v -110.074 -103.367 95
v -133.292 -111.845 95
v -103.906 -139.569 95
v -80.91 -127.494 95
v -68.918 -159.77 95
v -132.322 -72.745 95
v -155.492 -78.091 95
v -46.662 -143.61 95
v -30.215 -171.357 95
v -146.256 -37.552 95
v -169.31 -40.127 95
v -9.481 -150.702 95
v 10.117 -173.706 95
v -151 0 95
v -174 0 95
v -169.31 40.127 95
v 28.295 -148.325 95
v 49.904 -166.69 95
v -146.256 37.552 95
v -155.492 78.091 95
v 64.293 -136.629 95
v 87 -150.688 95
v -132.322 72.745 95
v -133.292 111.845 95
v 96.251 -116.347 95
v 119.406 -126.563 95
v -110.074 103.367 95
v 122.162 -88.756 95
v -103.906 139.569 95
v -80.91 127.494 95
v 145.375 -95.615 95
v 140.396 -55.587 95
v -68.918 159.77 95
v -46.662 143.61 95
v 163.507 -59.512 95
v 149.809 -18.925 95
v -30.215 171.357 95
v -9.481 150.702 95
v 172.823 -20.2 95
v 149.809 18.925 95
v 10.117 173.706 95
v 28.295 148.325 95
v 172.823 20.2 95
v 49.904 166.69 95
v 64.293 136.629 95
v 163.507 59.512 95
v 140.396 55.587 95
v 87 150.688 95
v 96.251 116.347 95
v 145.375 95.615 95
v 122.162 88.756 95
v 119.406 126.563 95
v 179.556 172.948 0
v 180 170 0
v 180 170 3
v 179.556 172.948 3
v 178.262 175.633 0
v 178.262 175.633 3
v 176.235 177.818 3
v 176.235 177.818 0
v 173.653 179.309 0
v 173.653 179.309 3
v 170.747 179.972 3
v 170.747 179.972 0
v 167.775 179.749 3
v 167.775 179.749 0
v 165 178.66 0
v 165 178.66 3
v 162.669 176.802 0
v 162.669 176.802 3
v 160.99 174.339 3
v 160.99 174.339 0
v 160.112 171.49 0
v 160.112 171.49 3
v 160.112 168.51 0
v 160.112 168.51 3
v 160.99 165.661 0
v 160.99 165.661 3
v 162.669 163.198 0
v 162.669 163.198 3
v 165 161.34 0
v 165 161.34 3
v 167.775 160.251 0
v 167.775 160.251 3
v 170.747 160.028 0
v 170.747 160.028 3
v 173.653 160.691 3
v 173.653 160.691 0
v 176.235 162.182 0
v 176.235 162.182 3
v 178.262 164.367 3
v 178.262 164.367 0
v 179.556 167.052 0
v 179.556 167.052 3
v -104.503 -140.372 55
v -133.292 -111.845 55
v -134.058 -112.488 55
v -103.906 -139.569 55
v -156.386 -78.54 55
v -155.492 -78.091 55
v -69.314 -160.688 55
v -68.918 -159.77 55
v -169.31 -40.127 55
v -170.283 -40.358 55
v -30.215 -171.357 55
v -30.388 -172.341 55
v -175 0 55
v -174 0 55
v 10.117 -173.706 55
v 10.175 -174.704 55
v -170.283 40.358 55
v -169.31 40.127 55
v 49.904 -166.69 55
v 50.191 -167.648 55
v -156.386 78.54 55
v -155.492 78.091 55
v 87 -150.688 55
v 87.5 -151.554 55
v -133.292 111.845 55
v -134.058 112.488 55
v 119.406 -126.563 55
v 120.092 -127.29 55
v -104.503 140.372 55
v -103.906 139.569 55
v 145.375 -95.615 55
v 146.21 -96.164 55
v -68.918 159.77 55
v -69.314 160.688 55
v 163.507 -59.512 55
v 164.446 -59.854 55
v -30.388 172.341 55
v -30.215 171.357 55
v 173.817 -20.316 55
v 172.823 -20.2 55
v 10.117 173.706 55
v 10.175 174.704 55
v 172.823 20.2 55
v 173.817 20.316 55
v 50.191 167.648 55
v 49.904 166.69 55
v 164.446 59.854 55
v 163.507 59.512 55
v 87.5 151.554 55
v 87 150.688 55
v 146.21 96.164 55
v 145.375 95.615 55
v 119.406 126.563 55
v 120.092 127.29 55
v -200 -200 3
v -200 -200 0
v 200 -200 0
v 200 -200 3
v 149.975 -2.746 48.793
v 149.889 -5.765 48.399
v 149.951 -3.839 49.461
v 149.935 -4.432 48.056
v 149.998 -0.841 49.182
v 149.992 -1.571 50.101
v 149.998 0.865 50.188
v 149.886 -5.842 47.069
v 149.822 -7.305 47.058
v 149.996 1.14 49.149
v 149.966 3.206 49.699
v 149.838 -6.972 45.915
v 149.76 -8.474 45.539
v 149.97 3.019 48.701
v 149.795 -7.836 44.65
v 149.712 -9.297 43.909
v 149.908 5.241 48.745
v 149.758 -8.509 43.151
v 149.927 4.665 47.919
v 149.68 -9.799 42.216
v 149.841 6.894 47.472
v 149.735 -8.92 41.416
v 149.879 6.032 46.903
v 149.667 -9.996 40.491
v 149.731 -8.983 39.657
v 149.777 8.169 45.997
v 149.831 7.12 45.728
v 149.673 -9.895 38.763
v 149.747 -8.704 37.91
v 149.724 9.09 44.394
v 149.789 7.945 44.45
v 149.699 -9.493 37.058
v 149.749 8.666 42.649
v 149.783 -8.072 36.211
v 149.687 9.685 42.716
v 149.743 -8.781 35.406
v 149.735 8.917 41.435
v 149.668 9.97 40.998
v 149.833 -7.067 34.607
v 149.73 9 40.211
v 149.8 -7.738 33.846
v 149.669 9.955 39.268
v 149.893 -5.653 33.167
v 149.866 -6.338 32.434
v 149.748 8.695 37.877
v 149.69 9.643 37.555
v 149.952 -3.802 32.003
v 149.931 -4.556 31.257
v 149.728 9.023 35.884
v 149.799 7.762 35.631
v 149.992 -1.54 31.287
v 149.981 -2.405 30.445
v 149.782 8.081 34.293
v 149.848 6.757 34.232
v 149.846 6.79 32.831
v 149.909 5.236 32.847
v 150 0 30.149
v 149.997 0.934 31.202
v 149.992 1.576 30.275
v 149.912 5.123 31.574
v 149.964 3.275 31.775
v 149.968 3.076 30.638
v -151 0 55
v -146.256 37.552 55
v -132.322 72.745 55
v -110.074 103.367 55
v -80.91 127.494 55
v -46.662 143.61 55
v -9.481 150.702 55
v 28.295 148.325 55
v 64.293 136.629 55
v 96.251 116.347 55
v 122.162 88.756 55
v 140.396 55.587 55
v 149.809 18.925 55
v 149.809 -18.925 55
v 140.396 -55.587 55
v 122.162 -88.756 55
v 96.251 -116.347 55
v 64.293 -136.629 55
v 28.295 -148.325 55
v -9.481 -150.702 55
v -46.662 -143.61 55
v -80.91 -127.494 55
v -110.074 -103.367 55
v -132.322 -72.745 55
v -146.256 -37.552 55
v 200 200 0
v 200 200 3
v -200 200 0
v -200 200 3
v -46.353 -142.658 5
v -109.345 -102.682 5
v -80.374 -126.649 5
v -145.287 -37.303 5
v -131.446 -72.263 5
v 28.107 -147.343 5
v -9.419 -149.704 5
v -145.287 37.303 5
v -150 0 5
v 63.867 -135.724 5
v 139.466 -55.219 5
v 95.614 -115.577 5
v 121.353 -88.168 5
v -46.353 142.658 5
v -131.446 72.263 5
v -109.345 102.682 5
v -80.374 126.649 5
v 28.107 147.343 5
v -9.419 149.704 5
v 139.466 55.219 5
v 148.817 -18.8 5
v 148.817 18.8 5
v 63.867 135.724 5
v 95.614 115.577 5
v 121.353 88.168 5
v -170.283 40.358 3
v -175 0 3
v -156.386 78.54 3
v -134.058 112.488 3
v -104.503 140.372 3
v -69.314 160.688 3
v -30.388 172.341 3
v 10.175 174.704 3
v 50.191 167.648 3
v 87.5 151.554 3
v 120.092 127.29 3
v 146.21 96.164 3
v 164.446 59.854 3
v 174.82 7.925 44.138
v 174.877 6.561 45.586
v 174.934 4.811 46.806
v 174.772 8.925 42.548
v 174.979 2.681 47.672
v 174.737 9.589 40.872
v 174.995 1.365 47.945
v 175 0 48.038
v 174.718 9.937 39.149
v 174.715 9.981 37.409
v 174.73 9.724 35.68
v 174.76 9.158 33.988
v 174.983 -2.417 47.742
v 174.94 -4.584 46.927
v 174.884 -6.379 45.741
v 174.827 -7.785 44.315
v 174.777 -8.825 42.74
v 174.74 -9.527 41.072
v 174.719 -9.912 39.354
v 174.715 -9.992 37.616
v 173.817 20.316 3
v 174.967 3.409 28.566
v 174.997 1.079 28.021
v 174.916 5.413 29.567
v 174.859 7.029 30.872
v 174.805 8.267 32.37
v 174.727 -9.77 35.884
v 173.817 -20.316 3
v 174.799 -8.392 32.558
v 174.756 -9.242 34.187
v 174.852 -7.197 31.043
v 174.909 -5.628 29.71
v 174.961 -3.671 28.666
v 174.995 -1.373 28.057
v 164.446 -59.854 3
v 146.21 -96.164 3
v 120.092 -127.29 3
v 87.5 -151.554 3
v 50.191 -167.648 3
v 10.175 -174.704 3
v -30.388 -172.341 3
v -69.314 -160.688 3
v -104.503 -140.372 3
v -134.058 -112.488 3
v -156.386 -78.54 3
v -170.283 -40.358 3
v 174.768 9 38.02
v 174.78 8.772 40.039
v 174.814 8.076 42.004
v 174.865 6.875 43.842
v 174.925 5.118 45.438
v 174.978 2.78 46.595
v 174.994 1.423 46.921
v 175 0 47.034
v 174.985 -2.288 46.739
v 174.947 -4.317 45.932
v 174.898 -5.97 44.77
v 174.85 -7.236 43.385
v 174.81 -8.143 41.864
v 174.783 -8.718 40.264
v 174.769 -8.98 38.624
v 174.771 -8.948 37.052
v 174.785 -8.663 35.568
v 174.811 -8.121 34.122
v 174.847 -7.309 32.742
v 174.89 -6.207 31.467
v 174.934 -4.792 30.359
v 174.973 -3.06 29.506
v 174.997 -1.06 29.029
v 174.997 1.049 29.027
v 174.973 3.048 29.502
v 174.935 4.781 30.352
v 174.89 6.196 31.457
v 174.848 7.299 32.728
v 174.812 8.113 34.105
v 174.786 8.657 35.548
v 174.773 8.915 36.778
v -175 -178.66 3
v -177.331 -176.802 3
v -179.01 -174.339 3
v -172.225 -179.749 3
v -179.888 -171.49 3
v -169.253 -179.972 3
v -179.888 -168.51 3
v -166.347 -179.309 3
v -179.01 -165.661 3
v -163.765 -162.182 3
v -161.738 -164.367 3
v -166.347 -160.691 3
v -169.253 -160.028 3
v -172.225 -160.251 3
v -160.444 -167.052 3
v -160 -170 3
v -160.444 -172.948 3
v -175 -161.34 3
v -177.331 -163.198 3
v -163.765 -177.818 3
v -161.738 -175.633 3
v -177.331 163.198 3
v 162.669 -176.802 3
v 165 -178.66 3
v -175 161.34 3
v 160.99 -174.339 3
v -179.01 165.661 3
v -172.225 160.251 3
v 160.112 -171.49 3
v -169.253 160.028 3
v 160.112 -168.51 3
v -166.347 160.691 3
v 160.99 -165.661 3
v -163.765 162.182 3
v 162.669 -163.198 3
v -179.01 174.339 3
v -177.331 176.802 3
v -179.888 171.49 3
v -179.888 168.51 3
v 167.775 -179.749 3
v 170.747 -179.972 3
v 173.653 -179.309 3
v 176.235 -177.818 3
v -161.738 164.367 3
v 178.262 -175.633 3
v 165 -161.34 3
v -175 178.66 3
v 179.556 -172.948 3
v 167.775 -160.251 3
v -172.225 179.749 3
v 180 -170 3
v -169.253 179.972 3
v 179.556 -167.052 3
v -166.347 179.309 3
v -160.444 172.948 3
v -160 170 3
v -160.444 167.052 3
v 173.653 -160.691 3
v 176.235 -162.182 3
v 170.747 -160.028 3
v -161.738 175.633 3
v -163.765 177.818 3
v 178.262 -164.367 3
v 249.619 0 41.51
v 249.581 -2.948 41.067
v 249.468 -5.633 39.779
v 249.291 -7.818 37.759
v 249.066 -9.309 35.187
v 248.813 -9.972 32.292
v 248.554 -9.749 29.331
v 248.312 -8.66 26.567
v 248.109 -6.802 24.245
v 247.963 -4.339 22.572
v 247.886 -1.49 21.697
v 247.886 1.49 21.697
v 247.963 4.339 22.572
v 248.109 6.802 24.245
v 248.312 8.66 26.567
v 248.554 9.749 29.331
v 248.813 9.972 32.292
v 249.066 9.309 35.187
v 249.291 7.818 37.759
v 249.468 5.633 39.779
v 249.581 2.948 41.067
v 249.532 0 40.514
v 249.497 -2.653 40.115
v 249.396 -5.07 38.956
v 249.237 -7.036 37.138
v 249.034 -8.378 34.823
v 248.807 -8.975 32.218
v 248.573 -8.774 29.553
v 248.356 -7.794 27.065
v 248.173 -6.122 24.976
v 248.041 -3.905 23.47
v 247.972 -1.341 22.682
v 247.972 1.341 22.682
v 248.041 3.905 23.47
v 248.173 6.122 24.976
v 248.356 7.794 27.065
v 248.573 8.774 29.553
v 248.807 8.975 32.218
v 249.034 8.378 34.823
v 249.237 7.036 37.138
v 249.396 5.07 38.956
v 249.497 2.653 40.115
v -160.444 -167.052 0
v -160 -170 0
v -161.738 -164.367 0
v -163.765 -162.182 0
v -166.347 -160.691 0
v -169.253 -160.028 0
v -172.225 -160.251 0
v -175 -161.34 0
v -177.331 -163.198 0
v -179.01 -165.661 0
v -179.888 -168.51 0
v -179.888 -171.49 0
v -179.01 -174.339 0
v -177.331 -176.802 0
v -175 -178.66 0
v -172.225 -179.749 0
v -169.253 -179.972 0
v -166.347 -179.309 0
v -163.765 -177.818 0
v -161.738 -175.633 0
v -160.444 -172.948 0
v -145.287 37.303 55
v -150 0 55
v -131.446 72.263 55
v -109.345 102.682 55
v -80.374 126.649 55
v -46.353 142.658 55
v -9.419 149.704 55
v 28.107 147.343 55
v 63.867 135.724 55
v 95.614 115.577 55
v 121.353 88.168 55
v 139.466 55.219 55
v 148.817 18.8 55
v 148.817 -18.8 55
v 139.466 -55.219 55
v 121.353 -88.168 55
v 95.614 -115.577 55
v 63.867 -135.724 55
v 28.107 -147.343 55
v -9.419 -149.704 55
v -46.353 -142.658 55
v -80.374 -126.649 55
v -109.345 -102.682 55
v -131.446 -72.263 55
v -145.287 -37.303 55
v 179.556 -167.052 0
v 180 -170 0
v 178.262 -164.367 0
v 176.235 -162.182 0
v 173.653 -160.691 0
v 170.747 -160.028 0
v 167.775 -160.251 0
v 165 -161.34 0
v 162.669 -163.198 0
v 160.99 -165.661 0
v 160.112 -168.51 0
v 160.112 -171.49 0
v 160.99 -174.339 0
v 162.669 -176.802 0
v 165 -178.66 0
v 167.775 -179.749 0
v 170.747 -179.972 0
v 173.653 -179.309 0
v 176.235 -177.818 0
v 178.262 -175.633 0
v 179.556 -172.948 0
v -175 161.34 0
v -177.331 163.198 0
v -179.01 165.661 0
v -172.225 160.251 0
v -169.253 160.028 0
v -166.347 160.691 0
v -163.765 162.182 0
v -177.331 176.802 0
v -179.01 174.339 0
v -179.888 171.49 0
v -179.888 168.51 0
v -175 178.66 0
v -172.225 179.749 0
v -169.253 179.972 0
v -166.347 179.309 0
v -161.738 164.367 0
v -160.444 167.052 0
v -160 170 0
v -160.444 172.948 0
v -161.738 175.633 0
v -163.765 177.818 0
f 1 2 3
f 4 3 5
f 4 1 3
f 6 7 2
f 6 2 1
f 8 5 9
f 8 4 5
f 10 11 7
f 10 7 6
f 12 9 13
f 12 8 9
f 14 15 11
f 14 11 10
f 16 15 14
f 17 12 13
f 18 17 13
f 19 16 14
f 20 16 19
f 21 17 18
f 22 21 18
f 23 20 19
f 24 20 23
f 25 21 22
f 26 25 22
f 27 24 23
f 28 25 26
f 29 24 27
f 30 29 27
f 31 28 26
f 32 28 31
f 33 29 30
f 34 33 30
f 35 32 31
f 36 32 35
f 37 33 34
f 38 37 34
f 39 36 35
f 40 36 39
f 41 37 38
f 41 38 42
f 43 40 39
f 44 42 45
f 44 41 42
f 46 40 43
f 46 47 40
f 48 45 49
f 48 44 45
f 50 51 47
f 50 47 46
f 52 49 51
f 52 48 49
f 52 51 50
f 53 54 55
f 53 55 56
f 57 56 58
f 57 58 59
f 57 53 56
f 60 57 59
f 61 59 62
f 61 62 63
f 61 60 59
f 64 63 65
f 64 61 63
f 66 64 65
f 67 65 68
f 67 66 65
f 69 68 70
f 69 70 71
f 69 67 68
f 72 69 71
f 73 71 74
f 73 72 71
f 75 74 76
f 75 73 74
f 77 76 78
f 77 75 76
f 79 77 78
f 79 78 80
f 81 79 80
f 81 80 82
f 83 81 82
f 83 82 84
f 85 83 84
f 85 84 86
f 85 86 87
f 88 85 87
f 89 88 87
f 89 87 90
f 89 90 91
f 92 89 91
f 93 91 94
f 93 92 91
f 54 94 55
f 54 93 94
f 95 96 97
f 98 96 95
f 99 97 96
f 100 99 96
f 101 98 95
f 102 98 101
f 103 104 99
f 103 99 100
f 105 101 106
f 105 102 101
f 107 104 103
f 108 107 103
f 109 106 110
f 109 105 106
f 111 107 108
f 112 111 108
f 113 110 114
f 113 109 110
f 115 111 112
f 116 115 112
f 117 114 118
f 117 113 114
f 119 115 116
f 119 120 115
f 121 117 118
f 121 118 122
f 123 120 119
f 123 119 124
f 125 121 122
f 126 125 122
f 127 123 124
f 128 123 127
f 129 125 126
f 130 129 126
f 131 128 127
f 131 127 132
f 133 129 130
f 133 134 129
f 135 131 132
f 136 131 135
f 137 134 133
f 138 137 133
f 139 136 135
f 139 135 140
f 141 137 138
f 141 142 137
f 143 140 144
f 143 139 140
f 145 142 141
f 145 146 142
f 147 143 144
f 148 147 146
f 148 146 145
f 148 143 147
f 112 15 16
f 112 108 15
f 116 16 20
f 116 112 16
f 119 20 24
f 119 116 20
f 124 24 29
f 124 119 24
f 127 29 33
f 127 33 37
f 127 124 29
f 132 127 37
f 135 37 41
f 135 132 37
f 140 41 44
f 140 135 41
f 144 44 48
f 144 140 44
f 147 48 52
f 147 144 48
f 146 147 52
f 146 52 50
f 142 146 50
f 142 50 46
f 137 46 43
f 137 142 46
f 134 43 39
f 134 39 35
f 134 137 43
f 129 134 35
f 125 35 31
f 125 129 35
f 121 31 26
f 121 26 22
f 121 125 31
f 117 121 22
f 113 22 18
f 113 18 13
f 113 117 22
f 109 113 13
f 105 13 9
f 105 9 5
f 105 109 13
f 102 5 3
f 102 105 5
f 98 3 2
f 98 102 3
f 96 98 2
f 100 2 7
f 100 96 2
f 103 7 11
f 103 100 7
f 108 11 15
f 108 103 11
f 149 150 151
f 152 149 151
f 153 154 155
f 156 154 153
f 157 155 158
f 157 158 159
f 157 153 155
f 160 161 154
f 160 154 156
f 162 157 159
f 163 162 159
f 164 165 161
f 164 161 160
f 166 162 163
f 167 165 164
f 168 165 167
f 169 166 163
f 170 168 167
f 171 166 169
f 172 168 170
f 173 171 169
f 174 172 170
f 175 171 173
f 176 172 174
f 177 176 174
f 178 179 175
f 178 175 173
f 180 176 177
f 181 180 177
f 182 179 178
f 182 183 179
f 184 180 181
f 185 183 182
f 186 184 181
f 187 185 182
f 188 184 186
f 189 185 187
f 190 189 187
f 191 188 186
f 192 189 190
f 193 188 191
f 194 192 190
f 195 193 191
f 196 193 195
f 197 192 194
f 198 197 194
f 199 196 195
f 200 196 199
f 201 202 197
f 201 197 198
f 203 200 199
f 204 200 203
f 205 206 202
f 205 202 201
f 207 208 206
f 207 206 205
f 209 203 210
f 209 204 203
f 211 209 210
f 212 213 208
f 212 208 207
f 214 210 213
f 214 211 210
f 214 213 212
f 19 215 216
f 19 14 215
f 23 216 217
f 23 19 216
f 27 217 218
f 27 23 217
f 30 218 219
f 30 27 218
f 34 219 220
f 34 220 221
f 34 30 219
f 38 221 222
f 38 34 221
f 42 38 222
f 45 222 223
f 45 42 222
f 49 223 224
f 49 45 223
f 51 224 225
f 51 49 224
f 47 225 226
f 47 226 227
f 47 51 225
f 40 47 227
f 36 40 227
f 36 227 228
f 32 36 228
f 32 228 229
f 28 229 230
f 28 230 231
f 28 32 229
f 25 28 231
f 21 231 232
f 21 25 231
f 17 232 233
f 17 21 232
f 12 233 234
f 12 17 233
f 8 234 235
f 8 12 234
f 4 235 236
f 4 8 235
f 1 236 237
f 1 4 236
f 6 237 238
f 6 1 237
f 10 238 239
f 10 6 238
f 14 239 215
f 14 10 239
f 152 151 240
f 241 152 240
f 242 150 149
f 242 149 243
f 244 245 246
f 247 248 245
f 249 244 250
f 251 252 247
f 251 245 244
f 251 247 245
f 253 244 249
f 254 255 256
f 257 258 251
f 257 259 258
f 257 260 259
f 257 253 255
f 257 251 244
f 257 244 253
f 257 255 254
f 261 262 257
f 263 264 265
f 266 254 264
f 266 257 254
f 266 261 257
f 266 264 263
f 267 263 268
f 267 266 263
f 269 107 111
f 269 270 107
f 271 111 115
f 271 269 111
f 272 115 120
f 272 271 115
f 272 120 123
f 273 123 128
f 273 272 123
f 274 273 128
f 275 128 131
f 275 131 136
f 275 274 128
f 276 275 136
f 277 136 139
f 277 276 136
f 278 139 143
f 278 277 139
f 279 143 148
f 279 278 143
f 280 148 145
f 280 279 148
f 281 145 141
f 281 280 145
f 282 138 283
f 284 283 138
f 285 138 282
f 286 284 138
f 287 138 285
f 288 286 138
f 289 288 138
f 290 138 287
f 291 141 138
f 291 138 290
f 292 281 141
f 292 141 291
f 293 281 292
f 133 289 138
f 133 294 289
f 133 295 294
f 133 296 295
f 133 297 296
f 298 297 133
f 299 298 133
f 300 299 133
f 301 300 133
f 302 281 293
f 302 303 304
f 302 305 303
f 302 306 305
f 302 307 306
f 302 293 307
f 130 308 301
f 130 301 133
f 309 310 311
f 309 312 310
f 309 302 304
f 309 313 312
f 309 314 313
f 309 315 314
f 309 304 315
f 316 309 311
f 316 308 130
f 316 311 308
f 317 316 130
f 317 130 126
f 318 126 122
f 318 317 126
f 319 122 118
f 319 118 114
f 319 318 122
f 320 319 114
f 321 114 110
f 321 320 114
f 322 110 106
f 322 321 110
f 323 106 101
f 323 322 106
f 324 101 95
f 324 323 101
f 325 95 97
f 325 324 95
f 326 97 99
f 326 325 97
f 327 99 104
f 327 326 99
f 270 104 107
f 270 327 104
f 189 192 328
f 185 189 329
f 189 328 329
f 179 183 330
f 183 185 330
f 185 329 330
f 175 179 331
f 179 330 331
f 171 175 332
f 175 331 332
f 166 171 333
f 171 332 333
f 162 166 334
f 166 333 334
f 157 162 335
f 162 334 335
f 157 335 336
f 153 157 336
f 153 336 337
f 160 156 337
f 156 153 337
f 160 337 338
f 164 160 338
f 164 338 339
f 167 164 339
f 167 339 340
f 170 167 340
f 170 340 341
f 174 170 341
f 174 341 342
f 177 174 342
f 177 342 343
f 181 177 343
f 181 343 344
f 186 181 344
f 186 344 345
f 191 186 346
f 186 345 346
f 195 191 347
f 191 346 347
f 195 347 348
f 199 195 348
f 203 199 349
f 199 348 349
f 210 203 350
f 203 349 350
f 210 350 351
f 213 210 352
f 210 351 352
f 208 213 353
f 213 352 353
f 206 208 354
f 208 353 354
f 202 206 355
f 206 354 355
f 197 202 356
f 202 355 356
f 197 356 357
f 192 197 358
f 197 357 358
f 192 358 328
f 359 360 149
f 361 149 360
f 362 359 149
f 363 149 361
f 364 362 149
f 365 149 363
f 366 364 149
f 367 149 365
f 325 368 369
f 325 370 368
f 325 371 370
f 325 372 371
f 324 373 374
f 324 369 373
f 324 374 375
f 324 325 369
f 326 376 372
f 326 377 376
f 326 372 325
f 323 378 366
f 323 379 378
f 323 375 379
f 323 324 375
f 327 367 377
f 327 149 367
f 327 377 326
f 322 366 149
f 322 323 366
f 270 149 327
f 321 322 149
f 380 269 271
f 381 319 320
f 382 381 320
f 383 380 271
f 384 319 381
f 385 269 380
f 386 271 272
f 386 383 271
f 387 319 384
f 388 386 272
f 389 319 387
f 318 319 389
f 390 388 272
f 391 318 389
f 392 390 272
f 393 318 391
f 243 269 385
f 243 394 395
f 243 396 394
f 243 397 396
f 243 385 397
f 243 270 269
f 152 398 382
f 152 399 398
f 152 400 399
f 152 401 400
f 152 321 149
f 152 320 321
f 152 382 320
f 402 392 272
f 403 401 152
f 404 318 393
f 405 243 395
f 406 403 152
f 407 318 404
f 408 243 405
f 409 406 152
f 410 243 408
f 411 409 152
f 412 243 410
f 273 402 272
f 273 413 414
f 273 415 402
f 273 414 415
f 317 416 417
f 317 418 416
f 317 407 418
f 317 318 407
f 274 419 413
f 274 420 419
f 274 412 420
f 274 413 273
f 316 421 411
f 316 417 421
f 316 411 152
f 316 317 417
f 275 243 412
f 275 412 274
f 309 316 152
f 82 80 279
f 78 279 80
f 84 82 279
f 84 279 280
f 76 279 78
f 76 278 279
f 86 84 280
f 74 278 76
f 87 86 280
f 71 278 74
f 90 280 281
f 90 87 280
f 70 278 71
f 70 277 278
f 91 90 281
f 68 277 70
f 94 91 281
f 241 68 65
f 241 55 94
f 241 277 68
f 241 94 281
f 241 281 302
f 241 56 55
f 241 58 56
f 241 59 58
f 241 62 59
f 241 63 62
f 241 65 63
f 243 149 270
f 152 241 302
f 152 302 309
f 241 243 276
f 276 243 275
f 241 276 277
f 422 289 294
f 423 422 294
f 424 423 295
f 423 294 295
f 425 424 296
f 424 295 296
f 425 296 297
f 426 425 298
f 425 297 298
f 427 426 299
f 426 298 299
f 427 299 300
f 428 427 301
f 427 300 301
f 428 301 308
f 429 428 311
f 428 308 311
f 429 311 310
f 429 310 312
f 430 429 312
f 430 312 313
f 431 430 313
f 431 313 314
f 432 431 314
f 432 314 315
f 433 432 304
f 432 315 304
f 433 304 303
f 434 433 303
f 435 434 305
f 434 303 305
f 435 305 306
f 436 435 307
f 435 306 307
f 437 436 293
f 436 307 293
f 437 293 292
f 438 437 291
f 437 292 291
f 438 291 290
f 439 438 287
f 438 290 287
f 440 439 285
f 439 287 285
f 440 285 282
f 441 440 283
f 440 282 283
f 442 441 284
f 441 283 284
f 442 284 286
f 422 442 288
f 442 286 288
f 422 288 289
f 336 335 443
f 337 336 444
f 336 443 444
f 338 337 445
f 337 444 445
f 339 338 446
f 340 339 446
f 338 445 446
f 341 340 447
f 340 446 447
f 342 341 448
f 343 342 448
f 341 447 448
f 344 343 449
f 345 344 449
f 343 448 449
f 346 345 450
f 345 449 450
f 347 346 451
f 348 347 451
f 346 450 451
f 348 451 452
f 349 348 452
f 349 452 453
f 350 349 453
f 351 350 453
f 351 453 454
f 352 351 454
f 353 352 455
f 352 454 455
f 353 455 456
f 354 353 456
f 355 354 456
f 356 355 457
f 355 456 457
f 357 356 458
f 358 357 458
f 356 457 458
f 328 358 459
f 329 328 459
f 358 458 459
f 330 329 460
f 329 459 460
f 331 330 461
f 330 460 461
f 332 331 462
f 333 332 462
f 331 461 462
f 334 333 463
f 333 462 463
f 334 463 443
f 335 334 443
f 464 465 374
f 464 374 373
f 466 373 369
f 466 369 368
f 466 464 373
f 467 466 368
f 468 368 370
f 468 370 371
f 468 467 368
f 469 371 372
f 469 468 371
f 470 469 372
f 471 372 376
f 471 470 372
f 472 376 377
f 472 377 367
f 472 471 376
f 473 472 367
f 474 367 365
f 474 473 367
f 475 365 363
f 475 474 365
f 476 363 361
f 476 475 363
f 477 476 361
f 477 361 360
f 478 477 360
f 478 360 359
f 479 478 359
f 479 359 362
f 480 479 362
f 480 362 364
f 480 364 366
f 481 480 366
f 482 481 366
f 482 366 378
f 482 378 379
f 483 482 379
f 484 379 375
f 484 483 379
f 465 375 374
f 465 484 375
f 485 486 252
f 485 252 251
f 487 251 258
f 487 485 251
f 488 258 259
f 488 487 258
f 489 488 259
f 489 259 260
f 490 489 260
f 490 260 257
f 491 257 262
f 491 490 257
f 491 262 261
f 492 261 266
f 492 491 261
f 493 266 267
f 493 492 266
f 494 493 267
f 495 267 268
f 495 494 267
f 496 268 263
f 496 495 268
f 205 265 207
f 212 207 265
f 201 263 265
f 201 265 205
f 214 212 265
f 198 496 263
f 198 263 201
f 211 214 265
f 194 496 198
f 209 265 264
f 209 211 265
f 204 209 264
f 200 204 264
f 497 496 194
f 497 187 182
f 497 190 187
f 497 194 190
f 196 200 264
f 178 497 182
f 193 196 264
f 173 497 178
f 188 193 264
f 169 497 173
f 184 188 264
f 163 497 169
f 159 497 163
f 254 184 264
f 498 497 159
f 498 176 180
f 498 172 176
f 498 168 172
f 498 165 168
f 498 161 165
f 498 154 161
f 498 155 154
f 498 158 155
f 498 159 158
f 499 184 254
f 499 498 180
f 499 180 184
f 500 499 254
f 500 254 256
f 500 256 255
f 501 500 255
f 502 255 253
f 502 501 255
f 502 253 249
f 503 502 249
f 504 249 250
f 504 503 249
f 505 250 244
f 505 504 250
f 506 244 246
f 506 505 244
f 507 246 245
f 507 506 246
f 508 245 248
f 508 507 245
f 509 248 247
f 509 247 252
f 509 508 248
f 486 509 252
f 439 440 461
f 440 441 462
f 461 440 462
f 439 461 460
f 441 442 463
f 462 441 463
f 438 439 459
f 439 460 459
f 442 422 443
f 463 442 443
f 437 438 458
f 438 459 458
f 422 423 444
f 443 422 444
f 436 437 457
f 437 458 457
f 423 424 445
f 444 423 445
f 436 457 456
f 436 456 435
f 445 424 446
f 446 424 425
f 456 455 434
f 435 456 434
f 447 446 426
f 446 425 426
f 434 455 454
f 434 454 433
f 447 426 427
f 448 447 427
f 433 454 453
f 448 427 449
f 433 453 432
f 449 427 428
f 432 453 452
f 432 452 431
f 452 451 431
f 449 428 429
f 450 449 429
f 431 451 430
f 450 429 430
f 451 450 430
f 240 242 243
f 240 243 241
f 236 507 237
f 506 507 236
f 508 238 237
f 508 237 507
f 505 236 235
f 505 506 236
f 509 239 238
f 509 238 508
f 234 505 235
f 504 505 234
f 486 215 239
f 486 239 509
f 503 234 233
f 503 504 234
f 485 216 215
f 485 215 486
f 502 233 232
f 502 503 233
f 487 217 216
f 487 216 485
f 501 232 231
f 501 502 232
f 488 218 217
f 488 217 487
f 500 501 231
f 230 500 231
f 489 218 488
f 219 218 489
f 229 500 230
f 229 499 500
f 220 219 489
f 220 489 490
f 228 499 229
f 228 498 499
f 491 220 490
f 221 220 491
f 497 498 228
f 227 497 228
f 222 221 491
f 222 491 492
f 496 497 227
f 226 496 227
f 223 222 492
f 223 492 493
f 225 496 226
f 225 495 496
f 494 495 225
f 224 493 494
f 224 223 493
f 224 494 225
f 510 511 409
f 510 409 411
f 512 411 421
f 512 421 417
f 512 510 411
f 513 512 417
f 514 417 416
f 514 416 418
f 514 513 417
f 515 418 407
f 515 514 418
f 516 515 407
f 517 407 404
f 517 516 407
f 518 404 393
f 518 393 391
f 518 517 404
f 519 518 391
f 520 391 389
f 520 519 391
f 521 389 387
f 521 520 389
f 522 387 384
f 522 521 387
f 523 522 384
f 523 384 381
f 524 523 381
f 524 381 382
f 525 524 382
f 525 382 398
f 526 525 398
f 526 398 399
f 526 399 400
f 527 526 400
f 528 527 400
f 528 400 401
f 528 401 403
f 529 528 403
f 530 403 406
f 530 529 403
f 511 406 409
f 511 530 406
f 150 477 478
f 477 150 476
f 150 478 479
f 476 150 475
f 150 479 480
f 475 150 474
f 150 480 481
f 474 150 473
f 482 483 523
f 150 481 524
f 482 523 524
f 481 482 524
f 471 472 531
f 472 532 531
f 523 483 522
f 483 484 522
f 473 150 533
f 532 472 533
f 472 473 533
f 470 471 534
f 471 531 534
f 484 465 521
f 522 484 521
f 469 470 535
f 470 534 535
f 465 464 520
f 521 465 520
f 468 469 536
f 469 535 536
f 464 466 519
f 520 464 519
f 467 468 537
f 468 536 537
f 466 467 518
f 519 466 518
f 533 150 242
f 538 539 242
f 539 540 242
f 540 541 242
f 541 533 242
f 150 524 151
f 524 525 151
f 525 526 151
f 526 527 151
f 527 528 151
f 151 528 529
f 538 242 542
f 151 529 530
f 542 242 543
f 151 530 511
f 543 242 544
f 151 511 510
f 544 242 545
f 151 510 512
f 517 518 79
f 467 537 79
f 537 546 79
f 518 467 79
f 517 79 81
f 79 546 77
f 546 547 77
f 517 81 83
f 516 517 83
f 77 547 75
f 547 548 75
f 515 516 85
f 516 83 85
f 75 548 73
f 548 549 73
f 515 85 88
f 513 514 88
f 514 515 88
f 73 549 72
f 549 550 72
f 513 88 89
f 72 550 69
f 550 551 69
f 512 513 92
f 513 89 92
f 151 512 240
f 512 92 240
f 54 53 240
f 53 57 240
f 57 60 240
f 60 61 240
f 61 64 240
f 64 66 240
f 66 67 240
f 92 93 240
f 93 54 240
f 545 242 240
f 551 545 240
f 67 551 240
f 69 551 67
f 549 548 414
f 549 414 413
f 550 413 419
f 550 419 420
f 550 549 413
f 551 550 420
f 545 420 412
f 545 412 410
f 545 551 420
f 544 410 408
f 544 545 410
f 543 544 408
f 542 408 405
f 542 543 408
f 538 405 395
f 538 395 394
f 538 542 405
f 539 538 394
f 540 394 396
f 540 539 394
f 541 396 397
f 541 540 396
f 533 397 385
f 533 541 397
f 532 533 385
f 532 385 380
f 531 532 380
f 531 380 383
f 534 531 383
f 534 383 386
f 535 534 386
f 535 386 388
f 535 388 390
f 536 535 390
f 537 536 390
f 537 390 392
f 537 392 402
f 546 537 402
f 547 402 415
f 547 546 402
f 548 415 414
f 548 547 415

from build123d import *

# Parameters (mm, degrees)
F0_W     = 10
F0_H     = 3
F2_W     = 400
F2_H     = 400
F2_R     = 10
F3_DEPTH = 3
F6_R     = 9
F7_DEPTH = 120
F8_R     = 150
F9_DEPTH = 200


with BuildPart() as f1:
    # F0 (on Front) → F1 (revolve)
    with BuildSketch(Plane.XZ):
        Polygon((-175, 5), (-150, 5), (-150, 55), (-151, 55), (-151, 95), (-174, 95), (-174, 55), (-175, 55), align=None)
        Polygon((-10, 5), (-150, 5), (-175, 5), (-175, 2), (-10, 2), align=None)
        with Locations((-5, 3.5)):
            Rectangle(F0_W, F0_H)
    revolve(axis=Axis((0, 0, 187.9212413023), (0, 0, -1)))

    # F2 (on Top) → F3 (join)
    with BuildSketch(Plane.XY):
        Rectangle(F2_W, F2_H)
        with Locations((-170, -170)):
            Circle(F2_R, mode=Mode.SUBTRACT)
        with Locations((170, -170)):
            Circle(F2_R, mode=Mode.SUBTRACT)
        with Locations((-170, 170)):
            Circle(F2_R, mode=Mode.SUBTRACT)
        with Locations((170, 170)):
            Circle(F2_R, mode=Mode.SUBTRACT)
    extrude(amount=F3_DEPTH)

    # F4 (on Front) → F5 (revolve)
    with BuildSketch(Plane.XZ):
        Polygon((249.6194698092, 41.5098406888), (150, 50.2254149636), (149.9128442573, 49.2292202655), (249.5323140664, 40.5136459907), align=None)
    revolve(axis=Axis((262.7442754949, 0, 30.3233706049), (0.9961946981, 0, -0.0871557427)))

    # F6 (on face) → F7 (cut)
    with BuildSketch(Plane(origin=(244.1192753946, 0, -21.3576691452), x_dir=(0, 1, 0), z_dir=(0.9961946981, 0, -0.0871557427))):
        with Locations((0, 53.1076535083)):
            Circle(F6_R)
    extrude(amount=-F7_DEPTH, mode=Mode.SUBTRACT)

    # F8 (on face) → F9 (cut)
    with BuildSketch(Plane.XY.offset(5)):
        Circle(F8_R)
    extrude(amount=F9_DEPTH, mode=Mode.SUBTRACT)


solid = f1.part
